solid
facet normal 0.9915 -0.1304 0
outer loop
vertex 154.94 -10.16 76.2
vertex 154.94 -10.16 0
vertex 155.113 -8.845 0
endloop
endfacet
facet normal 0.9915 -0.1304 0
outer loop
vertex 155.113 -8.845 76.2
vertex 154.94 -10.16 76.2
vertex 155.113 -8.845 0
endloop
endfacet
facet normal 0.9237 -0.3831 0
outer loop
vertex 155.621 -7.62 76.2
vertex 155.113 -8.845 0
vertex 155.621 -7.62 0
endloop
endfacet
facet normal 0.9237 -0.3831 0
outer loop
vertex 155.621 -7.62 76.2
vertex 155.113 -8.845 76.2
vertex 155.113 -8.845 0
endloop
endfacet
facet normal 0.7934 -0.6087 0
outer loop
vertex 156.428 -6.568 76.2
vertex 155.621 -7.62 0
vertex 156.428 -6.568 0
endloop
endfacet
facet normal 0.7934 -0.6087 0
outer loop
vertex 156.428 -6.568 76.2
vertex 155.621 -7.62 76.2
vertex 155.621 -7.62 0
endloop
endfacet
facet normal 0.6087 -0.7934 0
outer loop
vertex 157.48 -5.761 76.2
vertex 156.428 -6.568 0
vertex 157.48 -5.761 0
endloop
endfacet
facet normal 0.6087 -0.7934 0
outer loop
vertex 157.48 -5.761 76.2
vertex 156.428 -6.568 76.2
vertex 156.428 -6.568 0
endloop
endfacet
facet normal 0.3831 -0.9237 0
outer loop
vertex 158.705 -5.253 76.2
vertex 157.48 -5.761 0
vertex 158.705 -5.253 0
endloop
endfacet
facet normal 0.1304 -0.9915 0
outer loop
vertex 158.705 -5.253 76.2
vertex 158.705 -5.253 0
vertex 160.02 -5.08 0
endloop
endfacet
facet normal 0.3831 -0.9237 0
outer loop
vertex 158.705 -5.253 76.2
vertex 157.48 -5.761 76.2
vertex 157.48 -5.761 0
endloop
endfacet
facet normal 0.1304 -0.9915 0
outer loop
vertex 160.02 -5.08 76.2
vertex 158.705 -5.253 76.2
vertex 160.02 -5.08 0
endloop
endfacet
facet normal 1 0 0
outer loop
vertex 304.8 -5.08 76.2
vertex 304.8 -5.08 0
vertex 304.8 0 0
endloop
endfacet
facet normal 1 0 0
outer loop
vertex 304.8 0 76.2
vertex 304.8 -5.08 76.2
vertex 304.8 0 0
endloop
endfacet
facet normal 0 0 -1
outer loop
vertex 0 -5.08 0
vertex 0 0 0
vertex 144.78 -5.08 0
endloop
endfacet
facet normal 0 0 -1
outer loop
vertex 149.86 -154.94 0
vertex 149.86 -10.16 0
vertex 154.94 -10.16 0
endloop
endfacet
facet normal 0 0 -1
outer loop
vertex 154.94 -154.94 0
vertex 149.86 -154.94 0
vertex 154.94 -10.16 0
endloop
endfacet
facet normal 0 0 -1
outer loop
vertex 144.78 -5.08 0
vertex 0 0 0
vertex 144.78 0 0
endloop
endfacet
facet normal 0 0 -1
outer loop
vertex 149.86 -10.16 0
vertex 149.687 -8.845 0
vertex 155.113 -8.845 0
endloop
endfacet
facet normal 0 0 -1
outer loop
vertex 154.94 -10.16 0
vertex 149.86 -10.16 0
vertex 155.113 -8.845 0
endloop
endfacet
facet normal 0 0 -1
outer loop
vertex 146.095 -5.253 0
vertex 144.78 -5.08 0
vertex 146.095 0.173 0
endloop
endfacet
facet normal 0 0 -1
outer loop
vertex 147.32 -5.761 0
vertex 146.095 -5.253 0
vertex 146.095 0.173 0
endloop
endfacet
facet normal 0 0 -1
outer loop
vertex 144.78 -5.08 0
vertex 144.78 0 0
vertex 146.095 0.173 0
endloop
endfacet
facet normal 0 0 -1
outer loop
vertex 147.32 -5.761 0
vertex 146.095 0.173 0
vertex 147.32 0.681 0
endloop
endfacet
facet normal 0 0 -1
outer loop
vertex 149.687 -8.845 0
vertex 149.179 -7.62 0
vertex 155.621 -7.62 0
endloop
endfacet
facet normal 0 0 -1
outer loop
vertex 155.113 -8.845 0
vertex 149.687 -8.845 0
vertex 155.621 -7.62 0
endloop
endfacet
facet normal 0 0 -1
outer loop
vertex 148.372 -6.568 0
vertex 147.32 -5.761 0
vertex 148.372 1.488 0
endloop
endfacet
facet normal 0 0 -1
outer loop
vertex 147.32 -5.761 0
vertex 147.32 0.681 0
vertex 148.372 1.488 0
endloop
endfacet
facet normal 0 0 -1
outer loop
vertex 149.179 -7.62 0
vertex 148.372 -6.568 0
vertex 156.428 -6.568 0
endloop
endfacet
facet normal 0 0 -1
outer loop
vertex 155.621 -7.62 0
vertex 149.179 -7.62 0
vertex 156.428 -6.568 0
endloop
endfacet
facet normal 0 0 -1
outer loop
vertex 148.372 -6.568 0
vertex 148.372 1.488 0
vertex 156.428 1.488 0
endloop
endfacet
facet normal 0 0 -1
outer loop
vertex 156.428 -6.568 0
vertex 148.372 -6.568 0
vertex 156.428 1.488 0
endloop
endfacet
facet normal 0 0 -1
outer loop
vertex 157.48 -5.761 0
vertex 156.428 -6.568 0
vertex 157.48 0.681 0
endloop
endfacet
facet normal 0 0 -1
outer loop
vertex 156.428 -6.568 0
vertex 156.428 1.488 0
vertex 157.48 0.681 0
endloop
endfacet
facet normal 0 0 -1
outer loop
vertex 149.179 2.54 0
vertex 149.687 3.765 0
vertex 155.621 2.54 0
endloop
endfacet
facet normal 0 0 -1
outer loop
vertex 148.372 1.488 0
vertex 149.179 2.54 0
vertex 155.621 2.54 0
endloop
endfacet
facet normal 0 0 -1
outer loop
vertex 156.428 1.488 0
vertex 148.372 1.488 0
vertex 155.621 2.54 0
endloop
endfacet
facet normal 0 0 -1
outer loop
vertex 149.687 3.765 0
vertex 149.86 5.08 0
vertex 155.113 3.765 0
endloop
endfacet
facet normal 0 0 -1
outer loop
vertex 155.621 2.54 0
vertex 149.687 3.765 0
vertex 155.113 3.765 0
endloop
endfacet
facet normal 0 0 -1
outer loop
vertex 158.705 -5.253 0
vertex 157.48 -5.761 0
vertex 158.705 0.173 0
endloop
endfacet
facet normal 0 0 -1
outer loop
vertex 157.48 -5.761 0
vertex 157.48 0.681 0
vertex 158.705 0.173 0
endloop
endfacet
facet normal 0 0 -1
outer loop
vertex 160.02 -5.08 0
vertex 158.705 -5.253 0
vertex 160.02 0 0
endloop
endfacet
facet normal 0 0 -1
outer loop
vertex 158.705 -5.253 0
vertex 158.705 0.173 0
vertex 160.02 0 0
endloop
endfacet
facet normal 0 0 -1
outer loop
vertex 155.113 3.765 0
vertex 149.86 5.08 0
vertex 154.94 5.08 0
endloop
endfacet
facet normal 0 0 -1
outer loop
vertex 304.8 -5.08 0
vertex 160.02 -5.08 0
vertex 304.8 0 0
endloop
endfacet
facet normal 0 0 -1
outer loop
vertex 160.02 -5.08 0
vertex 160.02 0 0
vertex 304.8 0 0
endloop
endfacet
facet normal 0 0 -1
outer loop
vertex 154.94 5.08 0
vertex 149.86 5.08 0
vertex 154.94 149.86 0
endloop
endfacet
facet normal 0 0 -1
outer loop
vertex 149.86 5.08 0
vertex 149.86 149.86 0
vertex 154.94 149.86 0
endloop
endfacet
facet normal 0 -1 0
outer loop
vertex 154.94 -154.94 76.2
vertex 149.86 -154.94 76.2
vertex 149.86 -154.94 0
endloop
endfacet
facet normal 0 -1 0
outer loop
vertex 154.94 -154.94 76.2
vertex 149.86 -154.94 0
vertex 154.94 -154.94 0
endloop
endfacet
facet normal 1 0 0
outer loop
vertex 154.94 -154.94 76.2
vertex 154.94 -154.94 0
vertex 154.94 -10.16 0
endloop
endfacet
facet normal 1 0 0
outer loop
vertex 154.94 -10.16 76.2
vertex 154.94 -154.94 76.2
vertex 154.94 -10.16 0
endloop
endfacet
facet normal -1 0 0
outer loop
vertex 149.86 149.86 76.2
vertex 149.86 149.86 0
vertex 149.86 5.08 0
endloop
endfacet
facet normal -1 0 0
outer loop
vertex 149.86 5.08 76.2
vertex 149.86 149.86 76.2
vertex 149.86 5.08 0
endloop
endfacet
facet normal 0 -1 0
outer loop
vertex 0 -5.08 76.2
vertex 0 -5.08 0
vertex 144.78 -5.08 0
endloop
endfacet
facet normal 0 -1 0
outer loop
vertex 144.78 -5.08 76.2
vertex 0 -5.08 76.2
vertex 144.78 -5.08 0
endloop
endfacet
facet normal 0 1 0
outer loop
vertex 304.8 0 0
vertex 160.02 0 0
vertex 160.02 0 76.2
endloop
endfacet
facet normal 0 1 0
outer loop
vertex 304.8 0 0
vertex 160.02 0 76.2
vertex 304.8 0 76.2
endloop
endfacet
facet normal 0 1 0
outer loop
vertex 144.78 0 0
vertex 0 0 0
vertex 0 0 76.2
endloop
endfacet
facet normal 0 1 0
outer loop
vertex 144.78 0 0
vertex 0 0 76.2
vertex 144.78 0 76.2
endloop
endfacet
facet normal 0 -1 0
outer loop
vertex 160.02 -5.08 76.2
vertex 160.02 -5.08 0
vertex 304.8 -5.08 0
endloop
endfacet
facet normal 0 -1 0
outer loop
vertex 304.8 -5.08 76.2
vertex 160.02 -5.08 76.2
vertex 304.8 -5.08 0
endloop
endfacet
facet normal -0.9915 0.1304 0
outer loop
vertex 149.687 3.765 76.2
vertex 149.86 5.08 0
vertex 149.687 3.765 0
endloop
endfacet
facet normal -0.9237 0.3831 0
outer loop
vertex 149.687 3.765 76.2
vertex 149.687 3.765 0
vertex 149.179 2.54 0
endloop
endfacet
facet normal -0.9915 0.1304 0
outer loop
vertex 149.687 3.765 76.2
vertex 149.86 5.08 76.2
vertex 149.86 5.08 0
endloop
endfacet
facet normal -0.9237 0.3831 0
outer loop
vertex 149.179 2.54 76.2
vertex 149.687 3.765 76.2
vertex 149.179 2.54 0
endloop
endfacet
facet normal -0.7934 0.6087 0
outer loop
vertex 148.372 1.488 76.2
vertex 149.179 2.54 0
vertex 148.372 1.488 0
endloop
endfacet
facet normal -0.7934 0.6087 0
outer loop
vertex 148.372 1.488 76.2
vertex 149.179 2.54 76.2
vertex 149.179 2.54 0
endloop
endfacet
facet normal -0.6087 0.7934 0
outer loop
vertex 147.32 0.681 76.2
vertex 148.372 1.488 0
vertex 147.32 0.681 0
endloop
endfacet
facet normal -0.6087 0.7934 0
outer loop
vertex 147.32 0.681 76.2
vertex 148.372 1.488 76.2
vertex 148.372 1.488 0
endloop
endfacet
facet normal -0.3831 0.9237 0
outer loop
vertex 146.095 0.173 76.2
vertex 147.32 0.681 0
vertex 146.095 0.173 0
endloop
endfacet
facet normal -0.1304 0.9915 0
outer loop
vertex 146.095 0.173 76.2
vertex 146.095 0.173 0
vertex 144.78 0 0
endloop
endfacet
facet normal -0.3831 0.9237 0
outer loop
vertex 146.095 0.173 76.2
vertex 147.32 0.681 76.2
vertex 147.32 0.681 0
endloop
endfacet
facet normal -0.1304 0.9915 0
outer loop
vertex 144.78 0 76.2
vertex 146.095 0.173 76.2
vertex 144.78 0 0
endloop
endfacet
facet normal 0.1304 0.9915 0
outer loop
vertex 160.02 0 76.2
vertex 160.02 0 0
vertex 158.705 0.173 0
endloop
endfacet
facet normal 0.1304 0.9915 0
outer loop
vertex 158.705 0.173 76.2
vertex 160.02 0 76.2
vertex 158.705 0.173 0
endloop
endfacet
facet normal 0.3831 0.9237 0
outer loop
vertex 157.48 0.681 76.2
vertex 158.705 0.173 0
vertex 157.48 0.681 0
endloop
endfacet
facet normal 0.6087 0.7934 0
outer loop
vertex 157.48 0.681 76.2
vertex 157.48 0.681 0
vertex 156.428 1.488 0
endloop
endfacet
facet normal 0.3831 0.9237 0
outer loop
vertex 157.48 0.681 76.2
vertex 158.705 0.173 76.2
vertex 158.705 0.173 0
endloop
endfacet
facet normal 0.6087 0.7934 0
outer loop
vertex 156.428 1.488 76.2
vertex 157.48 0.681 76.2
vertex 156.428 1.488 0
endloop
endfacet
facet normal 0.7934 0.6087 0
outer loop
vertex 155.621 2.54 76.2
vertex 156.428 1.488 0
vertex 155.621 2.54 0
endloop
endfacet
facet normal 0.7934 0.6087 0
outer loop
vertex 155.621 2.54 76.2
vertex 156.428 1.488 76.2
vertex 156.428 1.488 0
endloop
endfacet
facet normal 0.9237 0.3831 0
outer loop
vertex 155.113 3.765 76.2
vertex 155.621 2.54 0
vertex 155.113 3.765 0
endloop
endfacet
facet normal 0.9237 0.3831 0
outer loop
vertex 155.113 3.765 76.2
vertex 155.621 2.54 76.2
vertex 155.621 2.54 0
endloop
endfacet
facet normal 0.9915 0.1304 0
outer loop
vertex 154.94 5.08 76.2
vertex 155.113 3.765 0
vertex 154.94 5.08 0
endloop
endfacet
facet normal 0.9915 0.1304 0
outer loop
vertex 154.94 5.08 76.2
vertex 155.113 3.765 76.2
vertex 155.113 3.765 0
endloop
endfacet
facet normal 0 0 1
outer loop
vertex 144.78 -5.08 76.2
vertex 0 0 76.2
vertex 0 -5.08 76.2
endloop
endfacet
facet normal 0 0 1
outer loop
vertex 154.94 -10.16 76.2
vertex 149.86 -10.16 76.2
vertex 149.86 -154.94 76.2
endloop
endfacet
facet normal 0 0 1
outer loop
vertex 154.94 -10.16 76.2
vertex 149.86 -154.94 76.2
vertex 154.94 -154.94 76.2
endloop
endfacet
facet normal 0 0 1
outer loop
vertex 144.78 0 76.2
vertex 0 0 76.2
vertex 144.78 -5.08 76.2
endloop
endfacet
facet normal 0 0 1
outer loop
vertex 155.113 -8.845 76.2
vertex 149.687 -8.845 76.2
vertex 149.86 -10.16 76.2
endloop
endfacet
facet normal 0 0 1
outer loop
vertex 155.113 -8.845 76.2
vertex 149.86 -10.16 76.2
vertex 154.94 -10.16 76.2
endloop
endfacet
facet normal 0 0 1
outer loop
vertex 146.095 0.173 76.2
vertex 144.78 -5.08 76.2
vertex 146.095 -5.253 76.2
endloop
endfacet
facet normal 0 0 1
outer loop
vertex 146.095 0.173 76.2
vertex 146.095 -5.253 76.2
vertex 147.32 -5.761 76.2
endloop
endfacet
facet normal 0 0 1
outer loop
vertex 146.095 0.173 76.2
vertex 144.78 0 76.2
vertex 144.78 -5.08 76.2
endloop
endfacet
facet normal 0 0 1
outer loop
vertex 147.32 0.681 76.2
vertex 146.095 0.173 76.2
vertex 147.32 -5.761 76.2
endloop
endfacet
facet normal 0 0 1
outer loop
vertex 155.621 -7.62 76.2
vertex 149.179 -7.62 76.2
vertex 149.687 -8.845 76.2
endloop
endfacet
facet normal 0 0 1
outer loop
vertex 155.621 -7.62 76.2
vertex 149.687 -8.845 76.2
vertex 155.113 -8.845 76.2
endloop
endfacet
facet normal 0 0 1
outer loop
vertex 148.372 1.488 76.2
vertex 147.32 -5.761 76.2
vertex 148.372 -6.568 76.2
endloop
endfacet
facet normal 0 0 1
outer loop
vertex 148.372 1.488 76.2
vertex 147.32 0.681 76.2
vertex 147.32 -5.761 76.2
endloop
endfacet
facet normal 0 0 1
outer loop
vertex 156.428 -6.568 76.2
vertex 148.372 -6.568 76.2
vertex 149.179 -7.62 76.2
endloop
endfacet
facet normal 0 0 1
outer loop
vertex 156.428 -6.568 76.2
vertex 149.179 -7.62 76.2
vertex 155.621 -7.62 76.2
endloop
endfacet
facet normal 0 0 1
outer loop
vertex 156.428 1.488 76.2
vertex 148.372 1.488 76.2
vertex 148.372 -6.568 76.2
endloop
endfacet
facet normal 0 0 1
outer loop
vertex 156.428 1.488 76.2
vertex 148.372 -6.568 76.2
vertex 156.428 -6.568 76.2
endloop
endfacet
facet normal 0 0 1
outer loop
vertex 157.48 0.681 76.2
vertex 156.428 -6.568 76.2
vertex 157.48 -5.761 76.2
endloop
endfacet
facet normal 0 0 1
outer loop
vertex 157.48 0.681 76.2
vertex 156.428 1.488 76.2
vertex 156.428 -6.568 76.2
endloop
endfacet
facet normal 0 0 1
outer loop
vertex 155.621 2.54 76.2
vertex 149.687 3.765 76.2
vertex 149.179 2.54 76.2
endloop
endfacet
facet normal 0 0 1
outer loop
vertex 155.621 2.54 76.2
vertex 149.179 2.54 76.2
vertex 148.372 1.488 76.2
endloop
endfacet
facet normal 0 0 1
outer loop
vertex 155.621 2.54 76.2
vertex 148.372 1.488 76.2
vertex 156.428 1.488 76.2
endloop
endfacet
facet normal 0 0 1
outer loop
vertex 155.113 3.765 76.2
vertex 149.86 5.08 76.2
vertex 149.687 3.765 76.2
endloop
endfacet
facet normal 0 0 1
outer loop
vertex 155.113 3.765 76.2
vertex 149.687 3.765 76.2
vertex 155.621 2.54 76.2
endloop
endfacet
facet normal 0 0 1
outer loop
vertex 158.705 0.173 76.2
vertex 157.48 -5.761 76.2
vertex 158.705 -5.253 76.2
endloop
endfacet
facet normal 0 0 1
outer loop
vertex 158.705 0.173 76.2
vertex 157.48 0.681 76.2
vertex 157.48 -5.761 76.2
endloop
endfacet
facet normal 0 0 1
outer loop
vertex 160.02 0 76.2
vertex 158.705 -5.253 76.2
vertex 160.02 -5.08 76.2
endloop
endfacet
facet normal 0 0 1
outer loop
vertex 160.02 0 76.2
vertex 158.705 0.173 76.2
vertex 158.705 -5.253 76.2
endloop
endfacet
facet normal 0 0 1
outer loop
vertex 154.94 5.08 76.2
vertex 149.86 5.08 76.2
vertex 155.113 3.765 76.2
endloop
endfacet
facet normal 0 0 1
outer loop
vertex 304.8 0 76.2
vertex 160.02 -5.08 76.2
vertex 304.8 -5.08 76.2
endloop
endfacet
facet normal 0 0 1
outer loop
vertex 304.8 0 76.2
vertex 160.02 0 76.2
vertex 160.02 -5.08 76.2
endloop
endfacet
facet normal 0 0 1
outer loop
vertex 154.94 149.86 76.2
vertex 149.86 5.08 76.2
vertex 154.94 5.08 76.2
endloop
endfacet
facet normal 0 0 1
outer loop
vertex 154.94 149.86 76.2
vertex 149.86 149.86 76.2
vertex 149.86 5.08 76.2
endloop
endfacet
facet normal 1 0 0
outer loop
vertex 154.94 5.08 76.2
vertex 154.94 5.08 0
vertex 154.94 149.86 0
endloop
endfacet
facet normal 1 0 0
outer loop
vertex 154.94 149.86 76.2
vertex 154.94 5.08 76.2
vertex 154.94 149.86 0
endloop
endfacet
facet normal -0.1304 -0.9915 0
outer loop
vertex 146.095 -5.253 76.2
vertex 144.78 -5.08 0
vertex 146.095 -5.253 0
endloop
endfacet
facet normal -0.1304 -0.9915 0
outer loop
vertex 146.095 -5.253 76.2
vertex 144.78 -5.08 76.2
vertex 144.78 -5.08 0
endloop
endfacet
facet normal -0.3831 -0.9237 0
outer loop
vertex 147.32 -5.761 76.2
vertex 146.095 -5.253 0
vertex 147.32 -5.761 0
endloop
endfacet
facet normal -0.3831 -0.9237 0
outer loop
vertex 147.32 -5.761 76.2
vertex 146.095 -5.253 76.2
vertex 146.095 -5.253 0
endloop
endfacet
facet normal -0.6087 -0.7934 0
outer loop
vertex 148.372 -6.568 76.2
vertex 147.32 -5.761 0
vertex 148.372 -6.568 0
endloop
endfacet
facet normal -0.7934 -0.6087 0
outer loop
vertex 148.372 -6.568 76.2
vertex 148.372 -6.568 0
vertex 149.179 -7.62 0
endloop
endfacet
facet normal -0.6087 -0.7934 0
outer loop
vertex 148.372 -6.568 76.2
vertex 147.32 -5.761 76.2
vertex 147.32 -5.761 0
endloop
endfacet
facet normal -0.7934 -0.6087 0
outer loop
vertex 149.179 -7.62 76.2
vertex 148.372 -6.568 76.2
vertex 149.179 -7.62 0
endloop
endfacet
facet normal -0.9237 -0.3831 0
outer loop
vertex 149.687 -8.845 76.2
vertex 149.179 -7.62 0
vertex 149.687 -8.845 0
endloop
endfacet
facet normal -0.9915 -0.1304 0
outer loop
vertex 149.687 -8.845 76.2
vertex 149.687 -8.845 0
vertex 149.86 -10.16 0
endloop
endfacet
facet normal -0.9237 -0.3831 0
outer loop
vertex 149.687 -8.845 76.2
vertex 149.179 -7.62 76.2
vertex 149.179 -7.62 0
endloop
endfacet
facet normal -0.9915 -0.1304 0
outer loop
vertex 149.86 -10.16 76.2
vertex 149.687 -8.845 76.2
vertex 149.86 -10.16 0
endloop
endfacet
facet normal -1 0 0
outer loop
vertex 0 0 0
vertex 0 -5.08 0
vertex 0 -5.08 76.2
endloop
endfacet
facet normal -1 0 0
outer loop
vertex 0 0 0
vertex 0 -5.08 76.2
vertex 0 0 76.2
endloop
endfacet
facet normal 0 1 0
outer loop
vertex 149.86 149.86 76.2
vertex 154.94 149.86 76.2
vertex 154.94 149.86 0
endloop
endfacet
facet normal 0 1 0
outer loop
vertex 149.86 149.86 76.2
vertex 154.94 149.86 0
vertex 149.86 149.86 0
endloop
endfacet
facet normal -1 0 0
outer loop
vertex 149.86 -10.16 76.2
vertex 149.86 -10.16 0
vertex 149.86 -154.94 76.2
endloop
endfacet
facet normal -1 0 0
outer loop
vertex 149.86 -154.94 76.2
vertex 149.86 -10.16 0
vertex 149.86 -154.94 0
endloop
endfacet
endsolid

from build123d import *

# Parameters (mm, degrees)
F0_W     = 149.86
F0_H     = 5.08
F0_W_2   = 2.54
F1_DEPTH = 76.2
F2_R     = 5.08


with BuildPart() as f1:
    # F0 (on Top) → F1 (new body)
    with BuildSketch(Plane.XY):
        with Locations((74.93, -2.54)):
            Rectangle(F0_W, F0_H)
        Polygon((149.86, 149.86), (149.86, 0), (152.4, 0), (154.94, 0), (154.94, 149.86), align=None)
        with Locations((229.87, -2.54)):
            Rectangle(F0_W, F0_H)
        with Locations((151.13, -2.54)):
            Rectangle(F0_W_2, F0_H)
        with Locations((153.67, -2.54)):
            Rectangle(F0_W_2, F0_H)
        Polygon((152.4, -5.08), (149.86, -5.08), (149.86, -154.94), (154.94, -154.94), (154.94, -5.08), align=None)
    extrude(amount=F1_DEPTH)

    # F2
    f2_edges = [f1.edges().sort_by_distance(p)[0] for p in [
        (149.86, -5.08, 38.1),
        (154.94, -5.08, 38.1),
        (154.94, 0, 38.1),
        (149.86, 0, 38.1),
    ]]
    fillet(f2_edges, radius=F2_R)


solid = f1.part
